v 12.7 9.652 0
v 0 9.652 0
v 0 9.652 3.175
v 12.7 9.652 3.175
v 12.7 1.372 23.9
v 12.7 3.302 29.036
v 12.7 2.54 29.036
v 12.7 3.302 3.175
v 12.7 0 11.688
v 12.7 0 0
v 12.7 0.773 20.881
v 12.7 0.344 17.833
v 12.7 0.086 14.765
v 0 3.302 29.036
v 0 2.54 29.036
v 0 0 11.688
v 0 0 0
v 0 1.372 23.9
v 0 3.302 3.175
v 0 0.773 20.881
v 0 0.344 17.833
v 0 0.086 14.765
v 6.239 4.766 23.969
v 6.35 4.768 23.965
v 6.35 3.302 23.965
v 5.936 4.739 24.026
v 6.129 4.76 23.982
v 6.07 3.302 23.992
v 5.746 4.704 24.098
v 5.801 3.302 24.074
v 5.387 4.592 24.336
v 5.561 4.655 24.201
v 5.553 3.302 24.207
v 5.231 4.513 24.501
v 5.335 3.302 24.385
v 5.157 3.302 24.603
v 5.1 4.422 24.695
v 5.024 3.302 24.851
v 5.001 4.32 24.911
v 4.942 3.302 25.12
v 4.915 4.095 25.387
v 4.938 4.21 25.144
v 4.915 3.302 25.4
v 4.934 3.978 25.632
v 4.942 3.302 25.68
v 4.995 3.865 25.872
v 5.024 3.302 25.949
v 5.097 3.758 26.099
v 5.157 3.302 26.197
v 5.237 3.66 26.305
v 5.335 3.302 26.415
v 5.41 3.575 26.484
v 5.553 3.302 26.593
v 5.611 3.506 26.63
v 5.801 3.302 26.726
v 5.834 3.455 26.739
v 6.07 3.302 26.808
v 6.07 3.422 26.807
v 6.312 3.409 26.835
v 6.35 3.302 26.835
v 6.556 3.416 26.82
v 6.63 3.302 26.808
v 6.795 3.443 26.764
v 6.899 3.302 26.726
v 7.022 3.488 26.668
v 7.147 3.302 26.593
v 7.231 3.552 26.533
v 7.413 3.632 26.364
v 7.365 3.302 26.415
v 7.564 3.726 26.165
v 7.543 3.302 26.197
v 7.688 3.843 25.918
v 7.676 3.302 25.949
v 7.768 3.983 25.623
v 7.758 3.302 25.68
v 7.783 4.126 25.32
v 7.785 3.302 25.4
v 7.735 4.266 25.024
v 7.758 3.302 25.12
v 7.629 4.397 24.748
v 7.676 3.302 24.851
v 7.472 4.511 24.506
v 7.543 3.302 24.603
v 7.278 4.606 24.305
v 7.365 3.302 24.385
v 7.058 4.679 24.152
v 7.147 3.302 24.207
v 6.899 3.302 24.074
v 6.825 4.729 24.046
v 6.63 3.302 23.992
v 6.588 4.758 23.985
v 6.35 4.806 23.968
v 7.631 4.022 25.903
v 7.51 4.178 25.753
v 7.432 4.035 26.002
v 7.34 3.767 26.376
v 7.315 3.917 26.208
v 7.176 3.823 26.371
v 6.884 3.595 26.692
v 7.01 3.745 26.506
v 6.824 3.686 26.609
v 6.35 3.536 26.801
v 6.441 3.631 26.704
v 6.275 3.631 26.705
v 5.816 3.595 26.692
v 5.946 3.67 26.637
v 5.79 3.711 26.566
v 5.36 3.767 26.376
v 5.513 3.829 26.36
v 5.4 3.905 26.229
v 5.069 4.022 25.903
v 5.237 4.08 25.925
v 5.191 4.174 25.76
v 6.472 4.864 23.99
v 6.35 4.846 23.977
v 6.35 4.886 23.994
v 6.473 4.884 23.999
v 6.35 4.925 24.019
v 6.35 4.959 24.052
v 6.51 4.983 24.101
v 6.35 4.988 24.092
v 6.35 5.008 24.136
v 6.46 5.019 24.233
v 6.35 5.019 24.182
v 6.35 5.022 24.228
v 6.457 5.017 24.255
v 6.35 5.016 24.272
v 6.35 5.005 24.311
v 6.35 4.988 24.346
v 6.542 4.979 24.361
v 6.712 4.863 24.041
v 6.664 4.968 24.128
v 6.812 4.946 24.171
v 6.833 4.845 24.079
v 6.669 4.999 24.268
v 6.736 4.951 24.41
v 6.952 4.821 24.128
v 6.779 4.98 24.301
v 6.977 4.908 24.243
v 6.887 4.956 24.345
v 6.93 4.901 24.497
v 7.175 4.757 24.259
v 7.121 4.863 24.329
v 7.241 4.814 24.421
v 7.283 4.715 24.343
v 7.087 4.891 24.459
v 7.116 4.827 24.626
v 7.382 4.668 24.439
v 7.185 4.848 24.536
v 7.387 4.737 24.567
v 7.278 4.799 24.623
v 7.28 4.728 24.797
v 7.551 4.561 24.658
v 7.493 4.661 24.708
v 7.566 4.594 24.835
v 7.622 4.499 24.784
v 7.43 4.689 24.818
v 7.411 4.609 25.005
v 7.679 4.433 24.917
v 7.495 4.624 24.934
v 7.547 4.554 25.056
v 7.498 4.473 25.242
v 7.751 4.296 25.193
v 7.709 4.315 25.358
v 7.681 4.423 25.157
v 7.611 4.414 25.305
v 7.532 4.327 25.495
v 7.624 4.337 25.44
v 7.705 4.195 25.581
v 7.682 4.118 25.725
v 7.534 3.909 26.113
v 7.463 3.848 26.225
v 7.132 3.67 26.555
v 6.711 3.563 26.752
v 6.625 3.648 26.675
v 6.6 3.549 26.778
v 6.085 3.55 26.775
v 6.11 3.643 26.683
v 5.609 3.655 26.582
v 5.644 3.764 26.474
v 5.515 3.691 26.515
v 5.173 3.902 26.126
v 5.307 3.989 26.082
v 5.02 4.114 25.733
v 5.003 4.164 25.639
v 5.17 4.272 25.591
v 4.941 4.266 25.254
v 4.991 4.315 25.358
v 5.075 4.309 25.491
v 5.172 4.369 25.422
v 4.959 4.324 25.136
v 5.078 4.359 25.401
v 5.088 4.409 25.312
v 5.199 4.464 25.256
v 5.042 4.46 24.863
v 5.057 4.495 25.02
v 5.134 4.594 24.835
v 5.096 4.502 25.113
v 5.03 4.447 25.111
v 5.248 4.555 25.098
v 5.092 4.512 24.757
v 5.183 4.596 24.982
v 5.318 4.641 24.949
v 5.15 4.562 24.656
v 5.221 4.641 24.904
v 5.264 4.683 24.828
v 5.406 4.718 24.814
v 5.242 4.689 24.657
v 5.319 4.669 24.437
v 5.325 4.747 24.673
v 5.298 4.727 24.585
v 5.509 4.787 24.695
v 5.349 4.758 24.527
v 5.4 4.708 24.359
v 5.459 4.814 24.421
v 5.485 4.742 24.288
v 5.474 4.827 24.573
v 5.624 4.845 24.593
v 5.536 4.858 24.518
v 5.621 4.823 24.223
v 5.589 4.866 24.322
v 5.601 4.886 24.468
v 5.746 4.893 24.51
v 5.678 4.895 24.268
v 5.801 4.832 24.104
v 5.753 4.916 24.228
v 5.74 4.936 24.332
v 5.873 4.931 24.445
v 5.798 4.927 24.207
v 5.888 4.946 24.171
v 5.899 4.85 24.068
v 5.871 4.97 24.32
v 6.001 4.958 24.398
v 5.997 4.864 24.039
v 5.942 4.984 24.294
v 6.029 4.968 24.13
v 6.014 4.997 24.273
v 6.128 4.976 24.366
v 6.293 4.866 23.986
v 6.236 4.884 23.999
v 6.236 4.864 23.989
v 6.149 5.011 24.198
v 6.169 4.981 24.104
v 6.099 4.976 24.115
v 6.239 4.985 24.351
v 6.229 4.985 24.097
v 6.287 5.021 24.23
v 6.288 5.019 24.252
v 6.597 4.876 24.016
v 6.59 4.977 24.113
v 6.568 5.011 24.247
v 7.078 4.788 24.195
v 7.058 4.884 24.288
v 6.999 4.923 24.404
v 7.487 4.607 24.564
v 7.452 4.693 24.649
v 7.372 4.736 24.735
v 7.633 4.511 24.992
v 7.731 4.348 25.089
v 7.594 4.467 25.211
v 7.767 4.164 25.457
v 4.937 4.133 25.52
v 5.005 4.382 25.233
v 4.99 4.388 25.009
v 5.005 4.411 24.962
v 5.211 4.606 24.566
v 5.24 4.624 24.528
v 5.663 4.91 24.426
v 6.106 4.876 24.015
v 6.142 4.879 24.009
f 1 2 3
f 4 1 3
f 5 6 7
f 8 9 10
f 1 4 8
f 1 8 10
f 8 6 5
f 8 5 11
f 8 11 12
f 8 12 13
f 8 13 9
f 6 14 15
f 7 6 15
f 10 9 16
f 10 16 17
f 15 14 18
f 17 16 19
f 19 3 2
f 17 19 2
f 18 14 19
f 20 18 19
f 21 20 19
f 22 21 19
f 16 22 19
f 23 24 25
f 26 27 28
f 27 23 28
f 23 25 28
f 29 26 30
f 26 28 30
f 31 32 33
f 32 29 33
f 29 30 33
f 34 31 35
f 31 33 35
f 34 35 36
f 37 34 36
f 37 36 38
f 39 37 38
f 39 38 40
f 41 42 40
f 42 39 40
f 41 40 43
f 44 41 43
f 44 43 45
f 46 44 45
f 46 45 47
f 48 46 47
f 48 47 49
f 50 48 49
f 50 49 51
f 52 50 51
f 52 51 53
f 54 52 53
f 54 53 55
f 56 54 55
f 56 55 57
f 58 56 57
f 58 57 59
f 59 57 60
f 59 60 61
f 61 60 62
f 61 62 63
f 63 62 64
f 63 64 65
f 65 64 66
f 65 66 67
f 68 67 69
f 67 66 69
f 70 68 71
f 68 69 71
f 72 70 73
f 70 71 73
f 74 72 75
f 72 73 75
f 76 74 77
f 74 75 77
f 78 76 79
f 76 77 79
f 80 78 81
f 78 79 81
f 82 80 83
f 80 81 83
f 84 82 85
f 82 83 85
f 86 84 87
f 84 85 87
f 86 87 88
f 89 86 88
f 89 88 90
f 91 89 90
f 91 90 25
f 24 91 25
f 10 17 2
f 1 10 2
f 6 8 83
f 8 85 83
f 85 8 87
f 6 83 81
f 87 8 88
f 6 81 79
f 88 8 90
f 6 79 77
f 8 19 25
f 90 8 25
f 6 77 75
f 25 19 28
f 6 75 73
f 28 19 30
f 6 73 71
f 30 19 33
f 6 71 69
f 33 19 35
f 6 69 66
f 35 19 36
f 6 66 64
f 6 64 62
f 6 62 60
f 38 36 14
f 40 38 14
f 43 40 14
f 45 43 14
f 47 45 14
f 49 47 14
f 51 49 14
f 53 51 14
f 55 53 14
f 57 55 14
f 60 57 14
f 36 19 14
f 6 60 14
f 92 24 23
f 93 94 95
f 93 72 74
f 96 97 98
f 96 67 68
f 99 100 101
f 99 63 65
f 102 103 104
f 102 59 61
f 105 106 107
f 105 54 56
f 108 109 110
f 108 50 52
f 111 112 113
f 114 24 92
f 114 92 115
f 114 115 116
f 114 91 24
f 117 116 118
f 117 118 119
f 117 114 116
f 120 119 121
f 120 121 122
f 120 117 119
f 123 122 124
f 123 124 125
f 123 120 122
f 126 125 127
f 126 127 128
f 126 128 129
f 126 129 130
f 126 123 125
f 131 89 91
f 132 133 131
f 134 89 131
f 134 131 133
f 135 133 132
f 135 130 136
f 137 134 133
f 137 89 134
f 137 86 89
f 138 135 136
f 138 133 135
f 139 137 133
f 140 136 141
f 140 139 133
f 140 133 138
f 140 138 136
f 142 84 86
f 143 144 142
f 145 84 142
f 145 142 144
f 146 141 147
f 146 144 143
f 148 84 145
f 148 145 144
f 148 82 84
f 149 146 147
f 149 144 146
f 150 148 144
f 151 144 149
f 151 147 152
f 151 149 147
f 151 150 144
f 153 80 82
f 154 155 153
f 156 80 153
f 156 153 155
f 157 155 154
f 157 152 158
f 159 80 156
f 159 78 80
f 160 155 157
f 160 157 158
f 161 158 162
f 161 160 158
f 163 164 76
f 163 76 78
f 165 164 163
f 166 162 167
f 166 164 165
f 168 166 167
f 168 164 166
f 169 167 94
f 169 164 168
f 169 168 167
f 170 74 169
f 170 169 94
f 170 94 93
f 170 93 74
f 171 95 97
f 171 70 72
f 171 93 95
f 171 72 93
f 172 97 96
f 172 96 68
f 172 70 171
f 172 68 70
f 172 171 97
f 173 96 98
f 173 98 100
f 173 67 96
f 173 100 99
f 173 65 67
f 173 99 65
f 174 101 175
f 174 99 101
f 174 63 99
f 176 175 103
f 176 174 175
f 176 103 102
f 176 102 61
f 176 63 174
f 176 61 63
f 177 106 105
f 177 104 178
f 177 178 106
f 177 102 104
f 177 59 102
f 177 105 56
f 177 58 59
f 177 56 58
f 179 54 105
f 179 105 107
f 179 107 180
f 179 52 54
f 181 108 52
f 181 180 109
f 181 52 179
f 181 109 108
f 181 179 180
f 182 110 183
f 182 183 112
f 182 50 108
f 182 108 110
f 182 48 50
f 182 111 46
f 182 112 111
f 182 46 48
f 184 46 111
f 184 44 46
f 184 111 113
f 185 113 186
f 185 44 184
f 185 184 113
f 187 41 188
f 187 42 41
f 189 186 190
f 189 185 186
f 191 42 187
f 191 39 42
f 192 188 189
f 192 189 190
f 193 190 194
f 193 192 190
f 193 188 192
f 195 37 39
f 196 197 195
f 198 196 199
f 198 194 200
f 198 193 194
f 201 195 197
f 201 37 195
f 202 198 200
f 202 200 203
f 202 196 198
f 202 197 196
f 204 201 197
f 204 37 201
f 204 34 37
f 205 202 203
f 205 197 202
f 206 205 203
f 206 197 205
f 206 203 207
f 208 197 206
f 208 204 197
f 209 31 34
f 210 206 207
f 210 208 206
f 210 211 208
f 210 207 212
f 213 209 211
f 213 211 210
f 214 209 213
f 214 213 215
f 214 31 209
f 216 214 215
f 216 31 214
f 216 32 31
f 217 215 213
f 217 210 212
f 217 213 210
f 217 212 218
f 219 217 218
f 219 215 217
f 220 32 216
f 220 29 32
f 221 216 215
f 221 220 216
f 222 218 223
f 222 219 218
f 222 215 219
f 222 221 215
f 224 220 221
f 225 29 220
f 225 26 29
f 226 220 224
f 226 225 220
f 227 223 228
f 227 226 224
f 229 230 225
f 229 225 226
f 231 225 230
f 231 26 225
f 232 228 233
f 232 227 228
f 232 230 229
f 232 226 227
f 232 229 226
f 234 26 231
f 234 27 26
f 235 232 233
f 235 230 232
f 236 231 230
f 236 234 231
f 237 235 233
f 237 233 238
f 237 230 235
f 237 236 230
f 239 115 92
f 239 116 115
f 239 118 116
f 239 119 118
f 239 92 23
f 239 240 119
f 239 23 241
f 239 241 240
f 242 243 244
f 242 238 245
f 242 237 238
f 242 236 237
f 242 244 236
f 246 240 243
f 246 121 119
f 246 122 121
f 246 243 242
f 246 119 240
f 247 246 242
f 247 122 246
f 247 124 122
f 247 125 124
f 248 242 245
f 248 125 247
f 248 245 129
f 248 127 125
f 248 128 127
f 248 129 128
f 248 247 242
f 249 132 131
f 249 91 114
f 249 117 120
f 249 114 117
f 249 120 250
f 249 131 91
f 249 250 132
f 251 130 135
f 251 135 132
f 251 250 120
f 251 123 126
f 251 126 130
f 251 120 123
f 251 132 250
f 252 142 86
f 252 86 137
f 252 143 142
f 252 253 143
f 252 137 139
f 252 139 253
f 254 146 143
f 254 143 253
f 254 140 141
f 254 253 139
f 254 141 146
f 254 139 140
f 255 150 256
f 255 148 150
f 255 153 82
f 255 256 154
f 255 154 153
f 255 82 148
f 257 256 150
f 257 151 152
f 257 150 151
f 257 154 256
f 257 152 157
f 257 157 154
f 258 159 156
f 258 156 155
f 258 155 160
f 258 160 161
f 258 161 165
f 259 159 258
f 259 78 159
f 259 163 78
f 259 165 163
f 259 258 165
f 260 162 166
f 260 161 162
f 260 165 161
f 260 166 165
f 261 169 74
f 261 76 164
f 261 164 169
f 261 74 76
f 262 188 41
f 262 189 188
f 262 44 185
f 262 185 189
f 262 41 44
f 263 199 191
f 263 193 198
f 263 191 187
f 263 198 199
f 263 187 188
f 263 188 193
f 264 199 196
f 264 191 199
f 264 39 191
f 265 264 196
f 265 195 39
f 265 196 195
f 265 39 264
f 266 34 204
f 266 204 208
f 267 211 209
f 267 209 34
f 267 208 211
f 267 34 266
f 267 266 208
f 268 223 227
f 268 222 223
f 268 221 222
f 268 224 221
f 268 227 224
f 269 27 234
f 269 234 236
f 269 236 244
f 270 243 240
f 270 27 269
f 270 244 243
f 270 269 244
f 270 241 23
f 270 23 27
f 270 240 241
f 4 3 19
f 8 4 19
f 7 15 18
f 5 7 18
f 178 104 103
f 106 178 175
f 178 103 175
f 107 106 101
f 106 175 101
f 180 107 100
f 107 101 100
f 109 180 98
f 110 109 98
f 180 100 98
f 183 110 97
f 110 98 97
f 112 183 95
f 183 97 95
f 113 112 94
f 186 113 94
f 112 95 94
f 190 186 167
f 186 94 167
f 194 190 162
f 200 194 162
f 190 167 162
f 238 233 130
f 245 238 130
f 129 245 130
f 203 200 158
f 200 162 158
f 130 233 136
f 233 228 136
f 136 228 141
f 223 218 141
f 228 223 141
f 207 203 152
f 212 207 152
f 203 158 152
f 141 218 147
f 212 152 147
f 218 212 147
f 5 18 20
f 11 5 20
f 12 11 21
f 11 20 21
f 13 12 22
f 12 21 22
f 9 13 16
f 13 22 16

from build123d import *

# Parameters (mm, degrees)
BOSS_EXTRUDE1_DEPTH = 12.7
SKETCH2_R           = 1.4351
BOSS_EXTRUDE2_DEPTH = 3.81
CUT_EXTRUDE1_DEPTH  = 34.12884745
FILLET1_R           = 0.254


with BuildPart() as part:
    # Sketch1 → Boss-Extrude1 (new body)
    with BuildSketch(Plane(origin=(0, 0, 0), x_dir=(0, 0, -1), z_dir=(1, 0, 0))):
        with BuildLine():
            ThreePointArc((-23.9, 1.3716), (-17.832549445, 0.343974693), (-11.688312193, 0))
            Line((-11.688312193, 0), (0, 0))
            Line((0, 0), (0, 9.652))
            Line((0, 9.652), (-3.175, 9.652))
            Line((-3.175, 9.652), (-3.175, 3.302))
            Line((-3.175, 3.302), (-29.035657895, 3.302))
            Line((-29.035657895, 3.302), (-29.035657895, 2.54))
            Line((-29.035657895, 2.54), (-23.9, 1.3716))
        make_face()
    extrude(amount=BOSS_EXTRUDE1_DEPTH)

    # Sketch2 → Boss-Extrude2 (add)
    with BuildSketch(Plane(origin=(0, 3.302, 0), x_dir=(1, 0, 0), z_dir=(0, 1, 0))):
        with Locations(Location((6.35, -25.4, 0), (0, 0, 90))):
            Circle(SKETCH2_R)
    extrude(amount=BOSS_EXTRUDE2_DEPTH)

    # Sketch3 → Cut-Extrude1 (cut, through all)
    with BuildSketch(Plane(origin=(12.7, 0, 0), x_dir=(0, 0, -1), z_dir=(1, 0, 0))):
        Polygon((-26.8351, 3.556), (-23.9649, 5.207), (-23.9649, 7.112), (-26.8351, 7.112), align=None)
    extrude(amount=-CUT_EXTRUDE1_DEPTH, mode=Mode.SUBTRACT)

    # Fillet1
    fillet1_edges = [part.edges().sort_by_distance(p)[0] for p in [
        (7.7851, 4.3815, 25.4),
    ]]
    fillet(fillet1_edges, radius=FILLET1_R)


solid = part.part
